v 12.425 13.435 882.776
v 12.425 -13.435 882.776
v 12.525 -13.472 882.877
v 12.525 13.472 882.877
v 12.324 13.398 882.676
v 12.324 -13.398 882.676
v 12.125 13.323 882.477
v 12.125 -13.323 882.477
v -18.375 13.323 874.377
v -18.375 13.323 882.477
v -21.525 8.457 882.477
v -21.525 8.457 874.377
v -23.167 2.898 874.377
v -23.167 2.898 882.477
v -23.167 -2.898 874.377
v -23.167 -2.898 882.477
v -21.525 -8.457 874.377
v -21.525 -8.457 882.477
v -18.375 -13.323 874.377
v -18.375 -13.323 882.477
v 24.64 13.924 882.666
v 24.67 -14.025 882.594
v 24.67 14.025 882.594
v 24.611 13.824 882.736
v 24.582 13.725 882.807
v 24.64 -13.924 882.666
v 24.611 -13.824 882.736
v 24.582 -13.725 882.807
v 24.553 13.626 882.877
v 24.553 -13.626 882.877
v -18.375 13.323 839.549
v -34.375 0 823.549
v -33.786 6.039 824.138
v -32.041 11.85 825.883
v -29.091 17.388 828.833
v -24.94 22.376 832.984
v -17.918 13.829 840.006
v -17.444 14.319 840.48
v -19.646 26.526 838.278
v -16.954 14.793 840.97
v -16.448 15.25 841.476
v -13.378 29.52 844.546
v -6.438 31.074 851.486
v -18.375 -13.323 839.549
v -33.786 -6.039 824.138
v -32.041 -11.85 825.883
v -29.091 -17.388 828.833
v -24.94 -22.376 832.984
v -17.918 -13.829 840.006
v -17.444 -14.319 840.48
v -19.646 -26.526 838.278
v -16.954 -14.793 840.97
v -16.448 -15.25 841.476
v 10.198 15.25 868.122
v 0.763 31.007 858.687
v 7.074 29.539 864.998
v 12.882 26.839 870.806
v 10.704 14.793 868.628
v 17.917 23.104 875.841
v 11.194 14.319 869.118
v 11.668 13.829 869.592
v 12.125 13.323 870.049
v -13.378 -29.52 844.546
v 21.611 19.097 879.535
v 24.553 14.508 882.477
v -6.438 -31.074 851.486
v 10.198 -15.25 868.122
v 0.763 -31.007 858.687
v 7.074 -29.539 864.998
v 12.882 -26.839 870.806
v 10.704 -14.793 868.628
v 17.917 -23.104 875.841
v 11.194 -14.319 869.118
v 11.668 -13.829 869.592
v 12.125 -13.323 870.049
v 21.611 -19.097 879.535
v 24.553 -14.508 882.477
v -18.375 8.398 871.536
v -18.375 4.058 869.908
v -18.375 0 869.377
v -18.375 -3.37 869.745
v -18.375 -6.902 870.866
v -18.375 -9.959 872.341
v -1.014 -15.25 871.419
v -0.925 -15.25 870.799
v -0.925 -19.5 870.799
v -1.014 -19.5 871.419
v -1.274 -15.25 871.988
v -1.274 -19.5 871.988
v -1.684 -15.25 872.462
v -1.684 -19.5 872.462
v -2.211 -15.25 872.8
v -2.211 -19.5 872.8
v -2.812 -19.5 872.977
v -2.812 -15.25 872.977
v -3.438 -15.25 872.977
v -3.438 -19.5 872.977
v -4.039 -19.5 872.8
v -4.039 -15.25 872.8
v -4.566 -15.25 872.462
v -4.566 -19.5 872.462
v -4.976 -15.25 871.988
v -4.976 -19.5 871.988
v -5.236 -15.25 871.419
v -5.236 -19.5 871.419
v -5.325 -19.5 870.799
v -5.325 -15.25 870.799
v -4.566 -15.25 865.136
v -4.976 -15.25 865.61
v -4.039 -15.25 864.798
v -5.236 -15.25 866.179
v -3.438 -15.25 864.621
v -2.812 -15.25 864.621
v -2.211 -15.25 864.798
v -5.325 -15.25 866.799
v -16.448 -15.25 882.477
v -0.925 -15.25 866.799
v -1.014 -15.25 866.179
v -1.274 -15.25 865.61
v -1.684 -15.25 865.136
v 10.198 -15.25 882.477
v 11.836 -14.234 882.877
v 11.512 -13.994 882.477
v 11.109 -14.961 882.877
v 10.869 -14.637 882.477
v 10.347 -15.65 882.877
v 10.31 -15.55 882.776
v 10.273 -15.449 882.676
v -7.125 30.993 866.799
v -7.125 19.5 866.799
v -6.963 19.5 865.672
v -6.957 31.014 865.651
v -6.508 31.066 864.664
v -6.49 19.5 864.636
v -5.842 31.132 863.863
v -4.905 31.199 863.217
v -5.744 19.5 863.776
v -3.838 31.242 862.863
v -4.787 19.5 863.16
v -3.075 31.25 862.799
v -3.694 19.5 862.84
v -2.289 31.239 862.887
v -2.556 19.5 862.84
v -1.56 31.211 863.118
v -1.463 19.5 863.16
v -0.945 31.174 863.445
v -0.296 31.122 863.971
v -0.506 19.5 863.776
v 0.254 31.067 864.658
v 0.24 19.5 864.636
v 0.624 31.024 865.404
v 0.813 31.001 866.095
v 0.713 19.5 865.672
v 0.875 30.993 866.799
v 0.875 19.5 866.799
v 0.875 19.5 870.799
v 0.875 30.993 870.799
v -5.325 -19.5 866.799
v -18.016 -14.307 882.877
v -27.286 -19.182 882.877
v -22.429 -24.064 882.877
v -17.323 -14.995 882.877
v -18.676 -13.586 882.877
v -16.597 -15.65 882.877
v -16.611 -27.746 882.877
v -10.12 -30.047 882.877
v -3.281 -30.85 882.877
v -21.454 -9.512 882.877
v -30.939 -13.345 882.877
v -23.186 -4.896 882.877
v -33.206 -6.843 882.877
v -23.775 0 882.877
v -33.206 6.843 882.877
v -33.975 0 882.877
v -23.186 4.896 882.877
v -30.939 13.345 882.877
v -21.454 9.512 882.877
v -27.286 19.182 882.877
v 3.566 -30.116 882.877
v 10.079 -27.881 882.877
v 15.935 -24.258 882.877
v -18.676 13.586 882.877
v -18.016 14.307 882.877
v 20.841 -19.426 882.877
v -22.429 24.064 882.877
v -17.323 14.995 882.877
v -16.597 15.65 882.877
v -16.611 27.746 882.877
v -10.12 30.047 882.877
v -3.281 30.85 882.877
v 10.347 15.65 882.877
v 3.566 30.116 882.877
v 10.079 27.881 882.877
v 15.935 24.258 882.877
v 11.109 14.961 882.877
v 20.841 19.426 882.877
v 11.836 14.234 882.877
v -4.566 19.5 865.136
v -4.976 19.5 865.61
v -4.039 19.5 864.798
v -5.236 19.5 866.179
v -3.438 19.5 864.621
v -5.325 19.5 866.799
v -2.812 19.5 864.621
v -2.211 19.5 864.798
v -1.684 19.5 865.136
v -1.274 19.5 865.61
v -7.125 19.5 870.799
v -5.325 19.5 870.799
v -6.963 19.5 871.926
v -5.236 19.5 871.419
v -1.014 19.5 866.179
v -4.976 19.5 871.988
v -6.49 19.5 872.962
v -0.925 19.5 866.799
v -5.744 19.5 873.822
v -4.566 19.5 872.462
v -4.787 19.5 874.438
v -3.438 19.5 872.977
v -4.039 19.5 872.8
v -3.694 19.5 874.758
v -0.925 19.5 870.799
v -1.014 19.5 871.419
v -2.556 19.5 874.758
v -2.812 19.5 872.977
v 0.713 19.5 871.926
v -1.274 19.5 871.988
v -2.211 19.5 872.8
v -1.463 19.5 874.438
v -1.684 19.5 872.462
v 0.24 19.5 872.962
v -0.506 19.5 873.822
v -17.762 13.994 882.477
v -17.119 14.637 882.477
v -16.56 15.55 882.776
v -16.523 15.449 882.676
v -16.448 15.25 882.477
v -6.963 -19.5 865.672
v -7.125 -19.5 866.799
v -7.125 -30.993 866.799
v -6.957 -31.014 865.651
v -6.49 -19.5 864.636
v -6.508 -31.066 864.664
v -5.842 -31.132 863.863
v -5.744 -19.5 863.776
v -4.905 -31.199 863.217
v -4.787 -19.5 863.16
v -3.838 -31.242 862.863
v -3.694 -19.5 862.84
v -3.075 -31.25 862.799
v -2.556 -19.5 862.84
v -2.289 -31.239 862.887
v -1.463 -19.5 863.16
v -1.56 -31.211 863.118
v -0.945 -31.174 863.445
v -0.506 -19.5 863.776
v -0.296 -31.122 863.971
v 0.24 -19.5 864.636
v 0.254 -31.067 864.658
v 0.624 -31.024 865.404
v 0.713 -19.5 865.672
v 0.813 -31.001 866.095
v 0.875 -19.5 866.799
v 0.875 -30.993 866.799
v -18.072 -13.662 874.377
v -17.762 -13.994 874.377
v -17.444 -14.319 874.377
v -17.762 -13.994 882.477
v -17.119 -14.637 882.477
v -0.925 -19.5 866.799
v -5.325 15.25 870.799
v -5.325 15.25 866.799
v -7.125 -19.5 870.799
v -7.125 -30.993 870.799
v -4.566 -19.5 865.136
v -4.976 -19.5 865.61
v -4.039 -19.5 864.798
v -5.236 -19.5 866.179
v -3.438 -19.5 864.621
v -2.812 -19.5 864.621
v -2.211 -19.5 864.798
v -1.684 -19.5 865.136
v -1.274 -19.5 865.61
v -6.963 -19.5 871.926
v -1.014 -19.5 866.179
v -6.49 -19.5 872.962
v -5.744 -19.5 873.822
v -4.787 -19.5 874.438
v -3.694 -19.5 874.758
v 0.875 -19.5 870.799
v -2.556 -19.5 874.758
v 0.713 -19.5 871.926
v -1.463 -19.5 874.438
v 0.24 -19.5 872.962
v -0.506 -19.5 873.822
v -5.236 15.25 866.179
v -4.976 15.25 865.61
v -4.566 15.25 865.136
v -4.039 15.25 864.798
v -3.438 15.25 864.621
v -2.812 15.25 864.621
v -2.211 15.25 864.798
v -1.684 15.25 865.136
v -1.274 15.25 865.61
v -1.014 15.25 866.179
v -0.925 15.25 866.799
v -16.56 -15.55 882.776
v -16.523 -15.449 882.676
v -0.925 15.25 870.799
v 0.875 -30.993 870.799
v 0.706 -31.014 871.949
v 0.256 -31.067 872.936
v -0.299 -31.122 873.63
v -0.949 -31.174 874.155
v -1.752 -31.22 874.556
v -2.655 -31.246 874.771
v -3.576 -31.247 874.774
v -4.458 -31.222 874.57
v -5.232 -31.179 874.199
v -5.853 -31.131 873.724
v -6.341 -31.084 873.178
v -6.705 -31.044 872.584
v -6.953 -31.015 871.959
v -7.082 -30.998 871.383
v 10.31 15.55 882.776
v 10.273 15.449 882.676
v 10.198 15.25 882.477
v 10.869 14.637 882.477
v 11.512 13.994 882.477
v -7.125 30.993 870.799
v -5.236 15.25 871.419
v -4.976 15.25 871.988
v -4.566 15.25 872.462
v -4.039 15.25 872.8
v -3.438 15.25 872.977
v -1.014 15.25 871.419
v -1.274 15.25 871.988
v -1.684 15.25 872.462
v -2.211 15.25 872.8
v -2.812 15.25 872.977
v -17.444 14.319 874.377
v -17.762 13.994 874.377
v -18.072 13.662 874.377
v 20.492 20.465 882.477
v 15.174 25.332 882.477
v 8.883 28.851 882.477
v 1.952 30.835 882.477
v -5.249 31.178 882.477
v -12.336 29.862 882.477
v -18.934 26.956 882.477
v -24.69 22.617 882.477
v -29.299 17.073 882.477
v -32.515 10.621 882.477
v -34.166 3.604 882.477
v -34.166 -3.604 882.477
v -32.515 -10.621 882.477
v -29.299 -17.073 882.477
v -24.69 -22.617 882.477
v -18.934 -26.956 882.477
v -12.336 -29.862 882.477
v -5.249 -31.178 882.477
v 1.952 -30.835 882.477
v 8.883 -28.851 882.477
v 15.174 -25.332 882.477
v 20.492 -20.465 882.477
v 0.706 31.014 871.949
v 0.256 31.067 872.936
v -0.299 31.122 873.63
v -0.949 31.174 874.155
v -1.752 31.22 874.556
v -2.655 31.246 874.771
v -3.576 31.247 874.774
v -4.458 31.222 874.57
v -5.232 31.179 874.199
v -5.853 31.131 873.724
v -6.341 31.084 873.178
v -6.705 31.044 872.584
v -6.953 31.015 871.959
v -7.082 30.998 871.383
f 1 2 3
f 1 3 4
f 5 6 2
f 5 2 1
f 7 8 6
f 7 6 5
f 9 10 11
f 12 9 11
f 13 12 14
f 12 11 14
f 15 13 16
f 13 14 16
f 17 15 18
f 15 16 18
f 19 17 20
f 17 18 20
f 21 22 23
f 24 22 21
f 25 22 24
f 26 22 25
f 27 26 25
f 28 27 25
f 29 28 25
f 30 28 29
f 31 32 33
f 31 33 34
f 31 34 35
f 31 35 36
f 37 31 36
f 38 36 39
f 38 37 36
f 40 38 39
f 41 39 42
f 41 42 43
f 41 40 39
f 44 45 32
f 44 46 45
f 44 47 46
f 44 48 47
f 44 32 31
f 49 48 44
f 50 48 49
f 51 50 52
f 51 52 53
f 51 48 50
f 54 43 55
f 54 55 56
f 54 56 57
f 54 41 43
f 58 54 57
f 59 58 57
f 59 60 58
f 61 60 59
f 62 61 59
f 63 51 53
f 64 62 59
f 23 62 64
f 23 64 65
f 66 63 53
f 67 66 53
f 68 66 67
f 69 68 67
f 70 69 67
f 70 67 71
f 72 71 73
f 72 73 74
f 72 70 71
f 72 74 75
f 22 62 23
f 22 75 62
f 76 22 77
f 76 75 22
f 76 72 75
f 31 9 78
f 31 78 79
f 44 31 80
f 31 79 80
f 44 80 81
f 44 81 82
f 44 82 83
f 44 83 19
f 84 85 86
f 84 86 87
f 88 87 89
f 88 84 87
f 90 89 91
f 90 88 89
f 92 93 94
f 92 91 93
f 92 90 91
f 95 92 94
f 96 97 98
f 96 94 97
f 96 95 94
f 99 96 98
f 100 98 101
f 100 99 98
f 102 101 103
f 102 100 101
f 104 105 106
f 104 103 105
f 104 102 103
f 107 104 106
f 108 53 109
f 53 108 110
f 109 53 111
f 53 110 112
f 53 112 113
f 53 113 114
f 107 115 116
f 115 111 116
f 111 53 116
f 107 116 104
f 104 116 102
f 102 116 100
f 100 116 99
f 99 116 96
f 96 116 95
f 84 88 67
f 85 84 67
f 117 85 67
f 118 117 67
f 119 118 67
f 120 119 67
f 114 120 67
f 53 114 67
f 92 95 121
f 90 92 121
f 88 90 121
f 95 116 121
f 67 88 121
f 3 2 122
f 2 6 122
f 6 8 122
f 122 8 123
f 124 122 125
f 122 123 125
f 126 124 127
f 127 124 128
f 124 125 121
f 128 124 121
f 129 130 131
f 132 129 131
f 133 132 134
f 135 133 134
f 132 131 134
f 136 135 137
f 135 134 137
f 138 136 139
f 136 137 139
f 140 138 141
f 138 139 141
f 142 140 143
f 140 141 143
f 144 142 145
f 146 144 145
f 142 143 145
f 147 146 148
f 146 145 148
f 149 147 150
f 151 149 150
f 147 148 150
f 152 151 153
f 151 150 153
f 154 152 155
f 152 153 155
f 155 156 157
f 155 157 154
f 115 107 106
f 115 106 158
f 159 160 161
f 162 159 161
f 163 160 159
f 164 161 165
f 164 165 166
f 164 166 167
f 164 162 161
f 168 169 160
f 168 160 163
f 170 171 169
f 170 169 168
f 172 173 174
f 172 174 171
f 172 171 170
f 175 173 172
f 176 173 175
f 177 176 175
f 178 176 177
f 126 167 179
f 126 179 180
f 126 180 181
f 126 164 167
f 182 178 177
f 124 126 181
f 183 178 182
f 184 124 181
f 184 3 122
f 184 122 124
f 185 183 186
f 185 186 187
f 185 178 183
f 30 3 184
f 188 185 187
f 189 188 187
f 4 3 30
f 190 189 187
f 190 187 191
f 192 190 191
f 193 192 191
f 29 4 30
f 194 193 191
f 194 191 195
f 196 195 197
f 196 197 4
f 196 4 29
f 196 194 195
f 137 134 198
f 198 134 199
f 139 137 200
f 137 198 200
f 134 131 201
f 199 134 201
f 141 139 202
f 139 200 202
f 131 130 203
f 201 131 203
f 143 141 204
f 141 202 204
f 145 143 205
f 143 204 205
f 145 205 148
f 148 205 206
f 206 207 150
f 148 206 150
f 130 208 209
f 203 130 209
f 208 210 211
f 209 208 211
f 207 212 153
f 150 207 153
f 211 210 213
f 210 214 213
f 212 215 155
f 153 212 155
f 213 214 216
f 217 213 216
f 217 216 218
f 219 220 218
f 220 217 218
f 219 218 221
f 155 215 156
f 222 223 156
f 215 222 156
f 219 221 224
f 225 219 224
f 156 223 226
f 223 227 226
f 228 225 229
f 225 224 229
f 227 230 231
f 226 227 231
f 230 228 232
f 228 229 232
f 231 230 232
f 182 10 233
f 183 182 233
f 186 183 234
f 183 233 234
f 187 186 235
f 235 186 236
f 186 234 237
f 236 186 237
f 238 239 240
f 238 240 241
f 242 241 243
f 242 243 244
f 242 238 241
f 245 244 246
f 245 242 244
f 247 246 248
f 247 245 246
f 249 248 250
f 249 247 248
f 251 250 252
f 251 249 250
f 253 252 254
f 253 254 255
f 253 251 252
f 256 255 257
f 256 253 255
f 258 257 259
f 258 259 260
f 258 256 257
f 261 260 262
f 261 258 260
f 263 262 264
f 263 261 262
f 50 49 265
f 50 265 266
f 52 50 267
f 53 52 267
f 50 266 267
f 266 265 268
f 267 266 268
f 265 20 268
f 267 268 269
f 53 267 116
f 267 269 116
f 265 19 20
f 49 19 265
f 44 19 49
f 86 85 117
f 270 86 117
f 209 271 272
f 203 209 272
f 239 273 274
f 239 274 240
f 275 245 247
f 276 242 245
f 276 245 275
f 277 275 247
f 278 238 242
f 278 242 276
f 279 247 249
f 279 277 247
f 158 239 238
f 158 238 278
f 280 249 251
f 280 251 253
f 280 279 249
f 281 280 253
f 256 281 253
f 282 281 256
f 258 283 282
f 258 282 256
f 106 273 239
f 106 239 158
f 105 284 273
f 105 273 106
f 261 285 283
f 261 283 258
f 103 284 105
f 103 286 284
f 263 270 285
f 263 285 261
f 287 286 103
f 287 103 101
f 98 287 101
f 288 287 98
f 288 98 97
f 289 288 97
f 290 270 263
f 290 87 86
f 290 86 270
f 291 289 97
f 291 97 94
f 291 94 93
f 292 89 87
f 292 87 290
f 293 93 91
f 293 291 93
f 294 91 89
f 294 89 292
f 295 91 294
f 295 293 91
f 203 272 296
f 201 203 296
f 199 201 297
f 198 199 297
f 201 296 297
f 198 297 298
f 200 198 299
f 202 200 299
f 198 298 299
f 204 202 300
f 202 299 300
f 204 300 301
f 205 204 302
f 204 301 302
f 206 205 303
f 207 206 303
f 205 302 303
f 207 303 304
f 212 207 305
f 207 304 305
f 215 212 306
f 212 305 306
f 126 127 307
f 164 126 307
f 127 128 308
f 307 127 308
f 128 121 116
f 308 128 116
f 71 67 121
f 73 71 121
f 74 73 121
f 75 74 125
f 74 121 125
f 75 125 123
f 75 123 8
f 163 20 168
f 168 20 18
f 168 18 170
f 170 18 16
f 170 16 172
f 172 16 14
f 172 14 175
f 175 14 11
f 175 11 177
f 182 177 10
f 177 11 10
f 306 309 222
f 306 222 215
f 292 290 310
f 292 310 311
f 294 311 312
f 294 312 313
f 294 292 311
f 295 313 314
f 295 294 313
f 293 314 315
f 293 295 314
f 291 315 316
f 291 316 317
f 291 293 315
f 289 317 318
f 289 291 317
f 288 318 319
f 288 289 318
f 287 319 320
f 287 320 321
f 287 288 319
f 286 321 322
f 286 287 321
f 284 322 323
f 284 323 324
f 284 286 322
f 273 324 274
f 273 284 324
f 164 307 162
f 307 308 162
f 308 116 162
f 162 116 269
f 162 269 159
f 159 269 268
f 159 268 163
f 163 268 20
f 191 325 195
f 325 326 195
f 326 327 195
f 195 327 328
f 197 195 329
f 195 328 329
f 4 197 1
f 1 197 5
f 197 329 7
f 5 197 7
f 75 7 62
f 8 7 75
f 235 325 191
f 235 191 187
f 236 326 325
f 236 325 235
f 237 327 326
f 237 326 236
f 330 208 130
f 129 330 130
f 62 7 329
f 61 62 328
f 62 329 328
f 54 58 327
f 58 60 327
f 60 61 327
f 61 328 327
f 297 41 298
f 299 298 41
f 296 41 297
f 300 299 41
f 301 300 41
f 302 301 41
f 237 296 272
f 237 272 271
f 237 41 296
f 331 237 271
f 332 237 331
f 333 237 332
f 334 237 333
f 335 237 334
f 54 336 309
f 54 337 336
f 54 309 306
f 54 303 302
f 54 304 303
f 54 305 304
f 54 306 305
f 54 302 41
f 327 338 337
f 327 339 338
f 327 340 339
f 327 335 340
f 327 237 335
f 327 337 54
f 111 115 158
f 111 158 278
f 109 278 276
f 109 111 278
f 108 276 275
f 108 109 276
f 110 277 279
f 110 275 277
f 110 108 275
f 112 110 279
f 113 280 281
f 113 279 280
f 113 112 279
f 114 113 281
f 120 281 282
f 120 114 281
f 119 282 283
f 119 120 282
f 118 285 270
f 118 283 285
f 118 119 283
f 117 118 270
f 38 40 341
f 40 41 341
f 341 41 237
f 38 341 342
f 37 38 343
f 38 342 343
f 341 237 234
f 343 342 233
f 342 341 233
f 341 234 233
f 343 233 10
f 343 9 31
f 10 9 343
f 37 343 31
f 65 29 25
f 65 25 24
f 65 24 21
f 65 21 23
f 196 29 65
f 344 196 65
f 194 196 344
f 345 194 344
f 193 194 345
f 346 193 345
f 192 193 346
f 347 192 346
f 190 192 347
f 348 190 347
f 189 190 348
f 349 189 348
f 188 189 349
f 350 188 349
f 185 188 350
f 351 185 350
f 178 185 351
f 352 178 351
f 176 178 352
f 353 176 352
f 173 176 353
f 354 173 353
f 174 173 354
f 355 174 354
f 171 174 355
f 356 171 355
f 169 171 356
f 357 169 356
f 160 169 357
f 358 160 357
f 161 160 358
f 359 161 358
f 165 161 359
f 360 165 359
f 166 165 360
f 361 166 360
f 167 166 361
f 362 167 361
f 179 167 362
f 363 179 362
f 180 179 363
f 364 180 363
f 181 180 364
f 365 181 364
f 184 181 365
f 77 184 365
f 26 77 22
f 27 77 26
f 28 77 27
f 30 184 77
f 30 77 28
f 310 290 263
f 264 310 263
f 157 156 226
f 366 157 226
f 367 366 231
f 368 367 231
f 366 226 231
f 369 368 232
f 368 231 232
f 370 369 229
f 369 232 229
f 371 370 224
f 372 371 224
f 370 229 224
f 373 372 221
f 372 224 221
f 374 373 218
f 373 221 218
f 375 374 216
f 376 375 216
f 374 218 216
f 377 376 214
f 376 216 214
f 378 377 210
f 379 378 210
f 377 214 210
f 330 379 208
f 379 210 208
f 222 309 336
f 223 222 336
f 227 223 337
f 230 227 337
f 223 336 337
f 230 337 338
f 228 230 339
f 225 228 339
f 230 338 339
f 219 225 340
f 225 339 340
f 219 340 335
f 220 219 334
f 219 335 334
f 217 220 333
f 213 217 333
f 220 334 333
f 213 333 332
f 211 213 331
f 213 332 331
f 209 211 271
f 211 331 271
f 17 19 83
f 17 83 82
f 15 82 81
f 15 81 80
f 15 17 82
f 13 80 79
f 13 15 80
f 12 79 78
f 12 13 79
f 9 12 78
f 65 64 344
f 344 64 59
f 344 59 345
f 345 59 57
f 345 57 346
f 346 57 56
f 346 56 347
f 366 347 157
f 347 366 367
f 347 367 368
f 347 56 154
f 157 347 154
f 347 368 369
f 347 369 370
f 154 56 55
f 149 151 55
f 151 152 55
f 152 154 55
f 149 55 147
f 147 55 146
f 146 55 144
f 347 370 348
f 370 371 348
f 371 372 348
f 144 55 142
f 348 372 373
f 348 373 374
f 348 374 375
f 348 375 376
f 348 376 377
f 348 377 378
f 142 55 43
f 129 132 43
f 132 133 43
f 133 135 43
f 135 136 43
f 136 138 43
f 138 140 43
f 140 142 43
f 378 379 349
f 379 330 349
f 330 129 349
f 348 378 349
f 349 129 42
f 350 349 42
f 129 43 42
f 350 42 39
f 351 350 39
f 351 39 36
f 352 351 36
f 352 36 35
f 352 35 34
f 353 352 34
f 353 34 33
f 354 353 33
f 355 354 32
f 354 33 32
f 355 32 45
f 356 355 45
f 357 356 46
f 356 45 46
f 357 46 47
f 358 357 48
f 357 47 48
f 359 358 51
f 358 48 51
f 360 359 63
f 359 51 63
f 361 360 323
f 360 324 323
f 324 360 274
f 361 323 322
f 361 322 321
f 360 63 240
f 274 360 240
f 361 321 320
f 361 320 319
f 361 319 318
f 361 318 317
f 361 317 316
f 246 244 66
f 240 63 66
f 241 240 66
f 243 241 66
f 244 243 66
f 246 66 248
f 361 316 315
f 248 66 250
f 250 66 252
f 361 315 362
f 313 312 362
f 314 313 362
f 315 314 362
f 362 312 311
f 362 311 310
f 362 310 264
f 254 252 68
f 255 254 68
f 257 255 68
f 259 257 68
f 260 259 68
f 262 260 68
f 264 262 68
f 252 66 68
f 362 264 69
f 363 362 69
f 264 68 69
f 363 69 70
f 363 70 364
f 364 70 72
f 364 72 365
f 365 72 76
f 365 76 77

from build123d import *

# Parameters (mm, degrees)
CYLINDER010_R        = 31.25
CYLINDER010_DEPTH    = 71.327905
POCKET071_DEPTH      = 43.251
POCKET071_DEPTH_BACK = 28.078905
POCKET084_DEPTH      = 8.5
POCKET085_DEPTH      = 31.251
POCKET085_DEPTH_BACK = 31.251
GROOVE_ANGLE         = -90
POCKET192_DEPTH      = 220.995838
CHAMFER003_SIZE      = 0.4


with BuildPart() as part:
    # Cylinder010 → Cylinder010 (join)
    with BuildSketch(Plane.XY.offset(-43.25)):
        Circle(CYLINDER010_R)
    extrude(amount=CYLINDER010_DEPTH)

    # Sketch132 → Pocket071 (cut, two sides)
    with BuildSketch(Plane.XY) as pocket071_sk:
        with BuildLine():
            Line((-13.322913, 15.25), (13.322913, 15.25))
            ThreePointArc((15.25, 13.322913), (14.318912, 14.318912), (13.322913, 15.25))
            Line((15.25, 13.322913), (15.25, -13.322913))
            ThreePointArc((13.322913, -15.25), (14.318912, -14.318912), (15.25, -13.322913))
            Line((-13.322913, -15.25), (13.322913, -15.25))
            ThreePointArc((-15.25, -13.322913), (-14.318912, -14.318912), (-13.322913, -15.25))
            Line((-15.25, 13.322913), (-15.25, -13.322913))
            ThreePointArc((-13.322913, 15.25), (-14.318912, 14.318912), (-15.25, 13.322913))
        make_face()
    extrude(amount=-POCKET071_DEPTH, mode=Mode.SUBTRACT)
    extrude(pocket071_sk.sketch, amount=POCKET071_DEPTH_BACK, mode=Mode.SUBTRACT)

    # Sketch140 → Pocket084 (cut)
    with BuildSketch(Plane.XY.offset(28.077905)):
        with BuildLine():
            ThreePointArc((-13.322913, 15.25), (-20.25, 0), (-13.322913, -15.25))
            Line((-13.322913, 15.25), (-13.322913, -15.25))
        make_face()
    extrude(amount=-POCKET084_DEPTH, mode=Mode.SUBTRACT)

    # Sketch130 → Pocket085 (cut, two sides)
    with BuildSketch(Plane.XZ) as pocket085_sk:
        Polygon((-33.55, -33.55), (33.55, 33.55), (33.55, -61.55), (-33.55, -61.55), align=None)
        with BuildLine():
            ThreePointArc((2.2, 16), (0, 18.2), (-2.2, 16))
            Line((-2.2, 16), (-2.2, 12))
            ThreePointArc((-2.2, 12), (0, 9.8), (2.2, 12))
            Line((2.2, 16), (2.2, 12))
        make_face()
    extrude(amount=-POCKET085_DEPTH, mode=Mode.SUBTRACT)
    extrude(pocket085_sk.sketch, amount=POCKET085_DEPTH_BACK, mode=Mode.SUBTRACT)

    # Sketch → Groove (revolve, symmetric, cut)
    with BuildSketch(Plane.XZ) as groove_sk:
        Polygon((-20.25, 19.577905), (0, 19.577905), (0, -0.672095), align=None)
    revolve(axis=Axis((0, 0, 0), (0, 0, 1)), revolution_arc=GROOVE_ANGLE / 2, mode=Mode.SUBTRACT)
    revolve(groove_sk.sketch, axis=Axis((0, 0, 0), (0, 0, -1)), revolution_arc=GROOVE_ANGLE / 2, mode=Mode.SUBTRACT)

    # Sketch131 → Pocket192 (cut, through all)
    with BuildSketch(Plane.XZ.offset(19.5)):
        with BuildLine():
            ThreePointArc((4, 16), (0, 20), (-4, 16))
            Line((-4, 16), (-4, 12))
            ThreePointArc((-4, 12), (0, 8), (4, 12))
            Line((4, 16), (4, 12))
        make_face()
    pocket192 = extrude(amount=POCKET192_DEPTH, mode=Mode.SUBTRACT)

    # Mirrored009: Pocket192 across XZ
    add(pocket192.mirror(Plane.XZ), mode=Mode.SUBTRACT)

    # Chamfer003
    chamfer003_edges = [part.edges().sort_by_distance(p)[0] for p in [
        (-31.25, 0, 28.077905),
        (28.077905, 0, 28.077905),
        (14.318912, -14.318912, 28.077905),
        (15.25, 0, 28.077905),
        (14.318912, 14.318912, 28.077905),
        (0, 15.25, 28.077905),
        (-14.318912, 14.318912, 28.077905),
        (-20.25, 0, 28.077905),
        (-14.318912, -14.318912, 28.077905),
        (0, -15.25, 28.077905),
    ]]
    chamfer(chamfer003_edges, length=CHAMFER003_SIZE)


with BuildPart() as part_1:
    # Body022026 placement: moved
    add(part.part.moved(Location((-3.125, 0, 854.79899))))


solid = part_1.part
